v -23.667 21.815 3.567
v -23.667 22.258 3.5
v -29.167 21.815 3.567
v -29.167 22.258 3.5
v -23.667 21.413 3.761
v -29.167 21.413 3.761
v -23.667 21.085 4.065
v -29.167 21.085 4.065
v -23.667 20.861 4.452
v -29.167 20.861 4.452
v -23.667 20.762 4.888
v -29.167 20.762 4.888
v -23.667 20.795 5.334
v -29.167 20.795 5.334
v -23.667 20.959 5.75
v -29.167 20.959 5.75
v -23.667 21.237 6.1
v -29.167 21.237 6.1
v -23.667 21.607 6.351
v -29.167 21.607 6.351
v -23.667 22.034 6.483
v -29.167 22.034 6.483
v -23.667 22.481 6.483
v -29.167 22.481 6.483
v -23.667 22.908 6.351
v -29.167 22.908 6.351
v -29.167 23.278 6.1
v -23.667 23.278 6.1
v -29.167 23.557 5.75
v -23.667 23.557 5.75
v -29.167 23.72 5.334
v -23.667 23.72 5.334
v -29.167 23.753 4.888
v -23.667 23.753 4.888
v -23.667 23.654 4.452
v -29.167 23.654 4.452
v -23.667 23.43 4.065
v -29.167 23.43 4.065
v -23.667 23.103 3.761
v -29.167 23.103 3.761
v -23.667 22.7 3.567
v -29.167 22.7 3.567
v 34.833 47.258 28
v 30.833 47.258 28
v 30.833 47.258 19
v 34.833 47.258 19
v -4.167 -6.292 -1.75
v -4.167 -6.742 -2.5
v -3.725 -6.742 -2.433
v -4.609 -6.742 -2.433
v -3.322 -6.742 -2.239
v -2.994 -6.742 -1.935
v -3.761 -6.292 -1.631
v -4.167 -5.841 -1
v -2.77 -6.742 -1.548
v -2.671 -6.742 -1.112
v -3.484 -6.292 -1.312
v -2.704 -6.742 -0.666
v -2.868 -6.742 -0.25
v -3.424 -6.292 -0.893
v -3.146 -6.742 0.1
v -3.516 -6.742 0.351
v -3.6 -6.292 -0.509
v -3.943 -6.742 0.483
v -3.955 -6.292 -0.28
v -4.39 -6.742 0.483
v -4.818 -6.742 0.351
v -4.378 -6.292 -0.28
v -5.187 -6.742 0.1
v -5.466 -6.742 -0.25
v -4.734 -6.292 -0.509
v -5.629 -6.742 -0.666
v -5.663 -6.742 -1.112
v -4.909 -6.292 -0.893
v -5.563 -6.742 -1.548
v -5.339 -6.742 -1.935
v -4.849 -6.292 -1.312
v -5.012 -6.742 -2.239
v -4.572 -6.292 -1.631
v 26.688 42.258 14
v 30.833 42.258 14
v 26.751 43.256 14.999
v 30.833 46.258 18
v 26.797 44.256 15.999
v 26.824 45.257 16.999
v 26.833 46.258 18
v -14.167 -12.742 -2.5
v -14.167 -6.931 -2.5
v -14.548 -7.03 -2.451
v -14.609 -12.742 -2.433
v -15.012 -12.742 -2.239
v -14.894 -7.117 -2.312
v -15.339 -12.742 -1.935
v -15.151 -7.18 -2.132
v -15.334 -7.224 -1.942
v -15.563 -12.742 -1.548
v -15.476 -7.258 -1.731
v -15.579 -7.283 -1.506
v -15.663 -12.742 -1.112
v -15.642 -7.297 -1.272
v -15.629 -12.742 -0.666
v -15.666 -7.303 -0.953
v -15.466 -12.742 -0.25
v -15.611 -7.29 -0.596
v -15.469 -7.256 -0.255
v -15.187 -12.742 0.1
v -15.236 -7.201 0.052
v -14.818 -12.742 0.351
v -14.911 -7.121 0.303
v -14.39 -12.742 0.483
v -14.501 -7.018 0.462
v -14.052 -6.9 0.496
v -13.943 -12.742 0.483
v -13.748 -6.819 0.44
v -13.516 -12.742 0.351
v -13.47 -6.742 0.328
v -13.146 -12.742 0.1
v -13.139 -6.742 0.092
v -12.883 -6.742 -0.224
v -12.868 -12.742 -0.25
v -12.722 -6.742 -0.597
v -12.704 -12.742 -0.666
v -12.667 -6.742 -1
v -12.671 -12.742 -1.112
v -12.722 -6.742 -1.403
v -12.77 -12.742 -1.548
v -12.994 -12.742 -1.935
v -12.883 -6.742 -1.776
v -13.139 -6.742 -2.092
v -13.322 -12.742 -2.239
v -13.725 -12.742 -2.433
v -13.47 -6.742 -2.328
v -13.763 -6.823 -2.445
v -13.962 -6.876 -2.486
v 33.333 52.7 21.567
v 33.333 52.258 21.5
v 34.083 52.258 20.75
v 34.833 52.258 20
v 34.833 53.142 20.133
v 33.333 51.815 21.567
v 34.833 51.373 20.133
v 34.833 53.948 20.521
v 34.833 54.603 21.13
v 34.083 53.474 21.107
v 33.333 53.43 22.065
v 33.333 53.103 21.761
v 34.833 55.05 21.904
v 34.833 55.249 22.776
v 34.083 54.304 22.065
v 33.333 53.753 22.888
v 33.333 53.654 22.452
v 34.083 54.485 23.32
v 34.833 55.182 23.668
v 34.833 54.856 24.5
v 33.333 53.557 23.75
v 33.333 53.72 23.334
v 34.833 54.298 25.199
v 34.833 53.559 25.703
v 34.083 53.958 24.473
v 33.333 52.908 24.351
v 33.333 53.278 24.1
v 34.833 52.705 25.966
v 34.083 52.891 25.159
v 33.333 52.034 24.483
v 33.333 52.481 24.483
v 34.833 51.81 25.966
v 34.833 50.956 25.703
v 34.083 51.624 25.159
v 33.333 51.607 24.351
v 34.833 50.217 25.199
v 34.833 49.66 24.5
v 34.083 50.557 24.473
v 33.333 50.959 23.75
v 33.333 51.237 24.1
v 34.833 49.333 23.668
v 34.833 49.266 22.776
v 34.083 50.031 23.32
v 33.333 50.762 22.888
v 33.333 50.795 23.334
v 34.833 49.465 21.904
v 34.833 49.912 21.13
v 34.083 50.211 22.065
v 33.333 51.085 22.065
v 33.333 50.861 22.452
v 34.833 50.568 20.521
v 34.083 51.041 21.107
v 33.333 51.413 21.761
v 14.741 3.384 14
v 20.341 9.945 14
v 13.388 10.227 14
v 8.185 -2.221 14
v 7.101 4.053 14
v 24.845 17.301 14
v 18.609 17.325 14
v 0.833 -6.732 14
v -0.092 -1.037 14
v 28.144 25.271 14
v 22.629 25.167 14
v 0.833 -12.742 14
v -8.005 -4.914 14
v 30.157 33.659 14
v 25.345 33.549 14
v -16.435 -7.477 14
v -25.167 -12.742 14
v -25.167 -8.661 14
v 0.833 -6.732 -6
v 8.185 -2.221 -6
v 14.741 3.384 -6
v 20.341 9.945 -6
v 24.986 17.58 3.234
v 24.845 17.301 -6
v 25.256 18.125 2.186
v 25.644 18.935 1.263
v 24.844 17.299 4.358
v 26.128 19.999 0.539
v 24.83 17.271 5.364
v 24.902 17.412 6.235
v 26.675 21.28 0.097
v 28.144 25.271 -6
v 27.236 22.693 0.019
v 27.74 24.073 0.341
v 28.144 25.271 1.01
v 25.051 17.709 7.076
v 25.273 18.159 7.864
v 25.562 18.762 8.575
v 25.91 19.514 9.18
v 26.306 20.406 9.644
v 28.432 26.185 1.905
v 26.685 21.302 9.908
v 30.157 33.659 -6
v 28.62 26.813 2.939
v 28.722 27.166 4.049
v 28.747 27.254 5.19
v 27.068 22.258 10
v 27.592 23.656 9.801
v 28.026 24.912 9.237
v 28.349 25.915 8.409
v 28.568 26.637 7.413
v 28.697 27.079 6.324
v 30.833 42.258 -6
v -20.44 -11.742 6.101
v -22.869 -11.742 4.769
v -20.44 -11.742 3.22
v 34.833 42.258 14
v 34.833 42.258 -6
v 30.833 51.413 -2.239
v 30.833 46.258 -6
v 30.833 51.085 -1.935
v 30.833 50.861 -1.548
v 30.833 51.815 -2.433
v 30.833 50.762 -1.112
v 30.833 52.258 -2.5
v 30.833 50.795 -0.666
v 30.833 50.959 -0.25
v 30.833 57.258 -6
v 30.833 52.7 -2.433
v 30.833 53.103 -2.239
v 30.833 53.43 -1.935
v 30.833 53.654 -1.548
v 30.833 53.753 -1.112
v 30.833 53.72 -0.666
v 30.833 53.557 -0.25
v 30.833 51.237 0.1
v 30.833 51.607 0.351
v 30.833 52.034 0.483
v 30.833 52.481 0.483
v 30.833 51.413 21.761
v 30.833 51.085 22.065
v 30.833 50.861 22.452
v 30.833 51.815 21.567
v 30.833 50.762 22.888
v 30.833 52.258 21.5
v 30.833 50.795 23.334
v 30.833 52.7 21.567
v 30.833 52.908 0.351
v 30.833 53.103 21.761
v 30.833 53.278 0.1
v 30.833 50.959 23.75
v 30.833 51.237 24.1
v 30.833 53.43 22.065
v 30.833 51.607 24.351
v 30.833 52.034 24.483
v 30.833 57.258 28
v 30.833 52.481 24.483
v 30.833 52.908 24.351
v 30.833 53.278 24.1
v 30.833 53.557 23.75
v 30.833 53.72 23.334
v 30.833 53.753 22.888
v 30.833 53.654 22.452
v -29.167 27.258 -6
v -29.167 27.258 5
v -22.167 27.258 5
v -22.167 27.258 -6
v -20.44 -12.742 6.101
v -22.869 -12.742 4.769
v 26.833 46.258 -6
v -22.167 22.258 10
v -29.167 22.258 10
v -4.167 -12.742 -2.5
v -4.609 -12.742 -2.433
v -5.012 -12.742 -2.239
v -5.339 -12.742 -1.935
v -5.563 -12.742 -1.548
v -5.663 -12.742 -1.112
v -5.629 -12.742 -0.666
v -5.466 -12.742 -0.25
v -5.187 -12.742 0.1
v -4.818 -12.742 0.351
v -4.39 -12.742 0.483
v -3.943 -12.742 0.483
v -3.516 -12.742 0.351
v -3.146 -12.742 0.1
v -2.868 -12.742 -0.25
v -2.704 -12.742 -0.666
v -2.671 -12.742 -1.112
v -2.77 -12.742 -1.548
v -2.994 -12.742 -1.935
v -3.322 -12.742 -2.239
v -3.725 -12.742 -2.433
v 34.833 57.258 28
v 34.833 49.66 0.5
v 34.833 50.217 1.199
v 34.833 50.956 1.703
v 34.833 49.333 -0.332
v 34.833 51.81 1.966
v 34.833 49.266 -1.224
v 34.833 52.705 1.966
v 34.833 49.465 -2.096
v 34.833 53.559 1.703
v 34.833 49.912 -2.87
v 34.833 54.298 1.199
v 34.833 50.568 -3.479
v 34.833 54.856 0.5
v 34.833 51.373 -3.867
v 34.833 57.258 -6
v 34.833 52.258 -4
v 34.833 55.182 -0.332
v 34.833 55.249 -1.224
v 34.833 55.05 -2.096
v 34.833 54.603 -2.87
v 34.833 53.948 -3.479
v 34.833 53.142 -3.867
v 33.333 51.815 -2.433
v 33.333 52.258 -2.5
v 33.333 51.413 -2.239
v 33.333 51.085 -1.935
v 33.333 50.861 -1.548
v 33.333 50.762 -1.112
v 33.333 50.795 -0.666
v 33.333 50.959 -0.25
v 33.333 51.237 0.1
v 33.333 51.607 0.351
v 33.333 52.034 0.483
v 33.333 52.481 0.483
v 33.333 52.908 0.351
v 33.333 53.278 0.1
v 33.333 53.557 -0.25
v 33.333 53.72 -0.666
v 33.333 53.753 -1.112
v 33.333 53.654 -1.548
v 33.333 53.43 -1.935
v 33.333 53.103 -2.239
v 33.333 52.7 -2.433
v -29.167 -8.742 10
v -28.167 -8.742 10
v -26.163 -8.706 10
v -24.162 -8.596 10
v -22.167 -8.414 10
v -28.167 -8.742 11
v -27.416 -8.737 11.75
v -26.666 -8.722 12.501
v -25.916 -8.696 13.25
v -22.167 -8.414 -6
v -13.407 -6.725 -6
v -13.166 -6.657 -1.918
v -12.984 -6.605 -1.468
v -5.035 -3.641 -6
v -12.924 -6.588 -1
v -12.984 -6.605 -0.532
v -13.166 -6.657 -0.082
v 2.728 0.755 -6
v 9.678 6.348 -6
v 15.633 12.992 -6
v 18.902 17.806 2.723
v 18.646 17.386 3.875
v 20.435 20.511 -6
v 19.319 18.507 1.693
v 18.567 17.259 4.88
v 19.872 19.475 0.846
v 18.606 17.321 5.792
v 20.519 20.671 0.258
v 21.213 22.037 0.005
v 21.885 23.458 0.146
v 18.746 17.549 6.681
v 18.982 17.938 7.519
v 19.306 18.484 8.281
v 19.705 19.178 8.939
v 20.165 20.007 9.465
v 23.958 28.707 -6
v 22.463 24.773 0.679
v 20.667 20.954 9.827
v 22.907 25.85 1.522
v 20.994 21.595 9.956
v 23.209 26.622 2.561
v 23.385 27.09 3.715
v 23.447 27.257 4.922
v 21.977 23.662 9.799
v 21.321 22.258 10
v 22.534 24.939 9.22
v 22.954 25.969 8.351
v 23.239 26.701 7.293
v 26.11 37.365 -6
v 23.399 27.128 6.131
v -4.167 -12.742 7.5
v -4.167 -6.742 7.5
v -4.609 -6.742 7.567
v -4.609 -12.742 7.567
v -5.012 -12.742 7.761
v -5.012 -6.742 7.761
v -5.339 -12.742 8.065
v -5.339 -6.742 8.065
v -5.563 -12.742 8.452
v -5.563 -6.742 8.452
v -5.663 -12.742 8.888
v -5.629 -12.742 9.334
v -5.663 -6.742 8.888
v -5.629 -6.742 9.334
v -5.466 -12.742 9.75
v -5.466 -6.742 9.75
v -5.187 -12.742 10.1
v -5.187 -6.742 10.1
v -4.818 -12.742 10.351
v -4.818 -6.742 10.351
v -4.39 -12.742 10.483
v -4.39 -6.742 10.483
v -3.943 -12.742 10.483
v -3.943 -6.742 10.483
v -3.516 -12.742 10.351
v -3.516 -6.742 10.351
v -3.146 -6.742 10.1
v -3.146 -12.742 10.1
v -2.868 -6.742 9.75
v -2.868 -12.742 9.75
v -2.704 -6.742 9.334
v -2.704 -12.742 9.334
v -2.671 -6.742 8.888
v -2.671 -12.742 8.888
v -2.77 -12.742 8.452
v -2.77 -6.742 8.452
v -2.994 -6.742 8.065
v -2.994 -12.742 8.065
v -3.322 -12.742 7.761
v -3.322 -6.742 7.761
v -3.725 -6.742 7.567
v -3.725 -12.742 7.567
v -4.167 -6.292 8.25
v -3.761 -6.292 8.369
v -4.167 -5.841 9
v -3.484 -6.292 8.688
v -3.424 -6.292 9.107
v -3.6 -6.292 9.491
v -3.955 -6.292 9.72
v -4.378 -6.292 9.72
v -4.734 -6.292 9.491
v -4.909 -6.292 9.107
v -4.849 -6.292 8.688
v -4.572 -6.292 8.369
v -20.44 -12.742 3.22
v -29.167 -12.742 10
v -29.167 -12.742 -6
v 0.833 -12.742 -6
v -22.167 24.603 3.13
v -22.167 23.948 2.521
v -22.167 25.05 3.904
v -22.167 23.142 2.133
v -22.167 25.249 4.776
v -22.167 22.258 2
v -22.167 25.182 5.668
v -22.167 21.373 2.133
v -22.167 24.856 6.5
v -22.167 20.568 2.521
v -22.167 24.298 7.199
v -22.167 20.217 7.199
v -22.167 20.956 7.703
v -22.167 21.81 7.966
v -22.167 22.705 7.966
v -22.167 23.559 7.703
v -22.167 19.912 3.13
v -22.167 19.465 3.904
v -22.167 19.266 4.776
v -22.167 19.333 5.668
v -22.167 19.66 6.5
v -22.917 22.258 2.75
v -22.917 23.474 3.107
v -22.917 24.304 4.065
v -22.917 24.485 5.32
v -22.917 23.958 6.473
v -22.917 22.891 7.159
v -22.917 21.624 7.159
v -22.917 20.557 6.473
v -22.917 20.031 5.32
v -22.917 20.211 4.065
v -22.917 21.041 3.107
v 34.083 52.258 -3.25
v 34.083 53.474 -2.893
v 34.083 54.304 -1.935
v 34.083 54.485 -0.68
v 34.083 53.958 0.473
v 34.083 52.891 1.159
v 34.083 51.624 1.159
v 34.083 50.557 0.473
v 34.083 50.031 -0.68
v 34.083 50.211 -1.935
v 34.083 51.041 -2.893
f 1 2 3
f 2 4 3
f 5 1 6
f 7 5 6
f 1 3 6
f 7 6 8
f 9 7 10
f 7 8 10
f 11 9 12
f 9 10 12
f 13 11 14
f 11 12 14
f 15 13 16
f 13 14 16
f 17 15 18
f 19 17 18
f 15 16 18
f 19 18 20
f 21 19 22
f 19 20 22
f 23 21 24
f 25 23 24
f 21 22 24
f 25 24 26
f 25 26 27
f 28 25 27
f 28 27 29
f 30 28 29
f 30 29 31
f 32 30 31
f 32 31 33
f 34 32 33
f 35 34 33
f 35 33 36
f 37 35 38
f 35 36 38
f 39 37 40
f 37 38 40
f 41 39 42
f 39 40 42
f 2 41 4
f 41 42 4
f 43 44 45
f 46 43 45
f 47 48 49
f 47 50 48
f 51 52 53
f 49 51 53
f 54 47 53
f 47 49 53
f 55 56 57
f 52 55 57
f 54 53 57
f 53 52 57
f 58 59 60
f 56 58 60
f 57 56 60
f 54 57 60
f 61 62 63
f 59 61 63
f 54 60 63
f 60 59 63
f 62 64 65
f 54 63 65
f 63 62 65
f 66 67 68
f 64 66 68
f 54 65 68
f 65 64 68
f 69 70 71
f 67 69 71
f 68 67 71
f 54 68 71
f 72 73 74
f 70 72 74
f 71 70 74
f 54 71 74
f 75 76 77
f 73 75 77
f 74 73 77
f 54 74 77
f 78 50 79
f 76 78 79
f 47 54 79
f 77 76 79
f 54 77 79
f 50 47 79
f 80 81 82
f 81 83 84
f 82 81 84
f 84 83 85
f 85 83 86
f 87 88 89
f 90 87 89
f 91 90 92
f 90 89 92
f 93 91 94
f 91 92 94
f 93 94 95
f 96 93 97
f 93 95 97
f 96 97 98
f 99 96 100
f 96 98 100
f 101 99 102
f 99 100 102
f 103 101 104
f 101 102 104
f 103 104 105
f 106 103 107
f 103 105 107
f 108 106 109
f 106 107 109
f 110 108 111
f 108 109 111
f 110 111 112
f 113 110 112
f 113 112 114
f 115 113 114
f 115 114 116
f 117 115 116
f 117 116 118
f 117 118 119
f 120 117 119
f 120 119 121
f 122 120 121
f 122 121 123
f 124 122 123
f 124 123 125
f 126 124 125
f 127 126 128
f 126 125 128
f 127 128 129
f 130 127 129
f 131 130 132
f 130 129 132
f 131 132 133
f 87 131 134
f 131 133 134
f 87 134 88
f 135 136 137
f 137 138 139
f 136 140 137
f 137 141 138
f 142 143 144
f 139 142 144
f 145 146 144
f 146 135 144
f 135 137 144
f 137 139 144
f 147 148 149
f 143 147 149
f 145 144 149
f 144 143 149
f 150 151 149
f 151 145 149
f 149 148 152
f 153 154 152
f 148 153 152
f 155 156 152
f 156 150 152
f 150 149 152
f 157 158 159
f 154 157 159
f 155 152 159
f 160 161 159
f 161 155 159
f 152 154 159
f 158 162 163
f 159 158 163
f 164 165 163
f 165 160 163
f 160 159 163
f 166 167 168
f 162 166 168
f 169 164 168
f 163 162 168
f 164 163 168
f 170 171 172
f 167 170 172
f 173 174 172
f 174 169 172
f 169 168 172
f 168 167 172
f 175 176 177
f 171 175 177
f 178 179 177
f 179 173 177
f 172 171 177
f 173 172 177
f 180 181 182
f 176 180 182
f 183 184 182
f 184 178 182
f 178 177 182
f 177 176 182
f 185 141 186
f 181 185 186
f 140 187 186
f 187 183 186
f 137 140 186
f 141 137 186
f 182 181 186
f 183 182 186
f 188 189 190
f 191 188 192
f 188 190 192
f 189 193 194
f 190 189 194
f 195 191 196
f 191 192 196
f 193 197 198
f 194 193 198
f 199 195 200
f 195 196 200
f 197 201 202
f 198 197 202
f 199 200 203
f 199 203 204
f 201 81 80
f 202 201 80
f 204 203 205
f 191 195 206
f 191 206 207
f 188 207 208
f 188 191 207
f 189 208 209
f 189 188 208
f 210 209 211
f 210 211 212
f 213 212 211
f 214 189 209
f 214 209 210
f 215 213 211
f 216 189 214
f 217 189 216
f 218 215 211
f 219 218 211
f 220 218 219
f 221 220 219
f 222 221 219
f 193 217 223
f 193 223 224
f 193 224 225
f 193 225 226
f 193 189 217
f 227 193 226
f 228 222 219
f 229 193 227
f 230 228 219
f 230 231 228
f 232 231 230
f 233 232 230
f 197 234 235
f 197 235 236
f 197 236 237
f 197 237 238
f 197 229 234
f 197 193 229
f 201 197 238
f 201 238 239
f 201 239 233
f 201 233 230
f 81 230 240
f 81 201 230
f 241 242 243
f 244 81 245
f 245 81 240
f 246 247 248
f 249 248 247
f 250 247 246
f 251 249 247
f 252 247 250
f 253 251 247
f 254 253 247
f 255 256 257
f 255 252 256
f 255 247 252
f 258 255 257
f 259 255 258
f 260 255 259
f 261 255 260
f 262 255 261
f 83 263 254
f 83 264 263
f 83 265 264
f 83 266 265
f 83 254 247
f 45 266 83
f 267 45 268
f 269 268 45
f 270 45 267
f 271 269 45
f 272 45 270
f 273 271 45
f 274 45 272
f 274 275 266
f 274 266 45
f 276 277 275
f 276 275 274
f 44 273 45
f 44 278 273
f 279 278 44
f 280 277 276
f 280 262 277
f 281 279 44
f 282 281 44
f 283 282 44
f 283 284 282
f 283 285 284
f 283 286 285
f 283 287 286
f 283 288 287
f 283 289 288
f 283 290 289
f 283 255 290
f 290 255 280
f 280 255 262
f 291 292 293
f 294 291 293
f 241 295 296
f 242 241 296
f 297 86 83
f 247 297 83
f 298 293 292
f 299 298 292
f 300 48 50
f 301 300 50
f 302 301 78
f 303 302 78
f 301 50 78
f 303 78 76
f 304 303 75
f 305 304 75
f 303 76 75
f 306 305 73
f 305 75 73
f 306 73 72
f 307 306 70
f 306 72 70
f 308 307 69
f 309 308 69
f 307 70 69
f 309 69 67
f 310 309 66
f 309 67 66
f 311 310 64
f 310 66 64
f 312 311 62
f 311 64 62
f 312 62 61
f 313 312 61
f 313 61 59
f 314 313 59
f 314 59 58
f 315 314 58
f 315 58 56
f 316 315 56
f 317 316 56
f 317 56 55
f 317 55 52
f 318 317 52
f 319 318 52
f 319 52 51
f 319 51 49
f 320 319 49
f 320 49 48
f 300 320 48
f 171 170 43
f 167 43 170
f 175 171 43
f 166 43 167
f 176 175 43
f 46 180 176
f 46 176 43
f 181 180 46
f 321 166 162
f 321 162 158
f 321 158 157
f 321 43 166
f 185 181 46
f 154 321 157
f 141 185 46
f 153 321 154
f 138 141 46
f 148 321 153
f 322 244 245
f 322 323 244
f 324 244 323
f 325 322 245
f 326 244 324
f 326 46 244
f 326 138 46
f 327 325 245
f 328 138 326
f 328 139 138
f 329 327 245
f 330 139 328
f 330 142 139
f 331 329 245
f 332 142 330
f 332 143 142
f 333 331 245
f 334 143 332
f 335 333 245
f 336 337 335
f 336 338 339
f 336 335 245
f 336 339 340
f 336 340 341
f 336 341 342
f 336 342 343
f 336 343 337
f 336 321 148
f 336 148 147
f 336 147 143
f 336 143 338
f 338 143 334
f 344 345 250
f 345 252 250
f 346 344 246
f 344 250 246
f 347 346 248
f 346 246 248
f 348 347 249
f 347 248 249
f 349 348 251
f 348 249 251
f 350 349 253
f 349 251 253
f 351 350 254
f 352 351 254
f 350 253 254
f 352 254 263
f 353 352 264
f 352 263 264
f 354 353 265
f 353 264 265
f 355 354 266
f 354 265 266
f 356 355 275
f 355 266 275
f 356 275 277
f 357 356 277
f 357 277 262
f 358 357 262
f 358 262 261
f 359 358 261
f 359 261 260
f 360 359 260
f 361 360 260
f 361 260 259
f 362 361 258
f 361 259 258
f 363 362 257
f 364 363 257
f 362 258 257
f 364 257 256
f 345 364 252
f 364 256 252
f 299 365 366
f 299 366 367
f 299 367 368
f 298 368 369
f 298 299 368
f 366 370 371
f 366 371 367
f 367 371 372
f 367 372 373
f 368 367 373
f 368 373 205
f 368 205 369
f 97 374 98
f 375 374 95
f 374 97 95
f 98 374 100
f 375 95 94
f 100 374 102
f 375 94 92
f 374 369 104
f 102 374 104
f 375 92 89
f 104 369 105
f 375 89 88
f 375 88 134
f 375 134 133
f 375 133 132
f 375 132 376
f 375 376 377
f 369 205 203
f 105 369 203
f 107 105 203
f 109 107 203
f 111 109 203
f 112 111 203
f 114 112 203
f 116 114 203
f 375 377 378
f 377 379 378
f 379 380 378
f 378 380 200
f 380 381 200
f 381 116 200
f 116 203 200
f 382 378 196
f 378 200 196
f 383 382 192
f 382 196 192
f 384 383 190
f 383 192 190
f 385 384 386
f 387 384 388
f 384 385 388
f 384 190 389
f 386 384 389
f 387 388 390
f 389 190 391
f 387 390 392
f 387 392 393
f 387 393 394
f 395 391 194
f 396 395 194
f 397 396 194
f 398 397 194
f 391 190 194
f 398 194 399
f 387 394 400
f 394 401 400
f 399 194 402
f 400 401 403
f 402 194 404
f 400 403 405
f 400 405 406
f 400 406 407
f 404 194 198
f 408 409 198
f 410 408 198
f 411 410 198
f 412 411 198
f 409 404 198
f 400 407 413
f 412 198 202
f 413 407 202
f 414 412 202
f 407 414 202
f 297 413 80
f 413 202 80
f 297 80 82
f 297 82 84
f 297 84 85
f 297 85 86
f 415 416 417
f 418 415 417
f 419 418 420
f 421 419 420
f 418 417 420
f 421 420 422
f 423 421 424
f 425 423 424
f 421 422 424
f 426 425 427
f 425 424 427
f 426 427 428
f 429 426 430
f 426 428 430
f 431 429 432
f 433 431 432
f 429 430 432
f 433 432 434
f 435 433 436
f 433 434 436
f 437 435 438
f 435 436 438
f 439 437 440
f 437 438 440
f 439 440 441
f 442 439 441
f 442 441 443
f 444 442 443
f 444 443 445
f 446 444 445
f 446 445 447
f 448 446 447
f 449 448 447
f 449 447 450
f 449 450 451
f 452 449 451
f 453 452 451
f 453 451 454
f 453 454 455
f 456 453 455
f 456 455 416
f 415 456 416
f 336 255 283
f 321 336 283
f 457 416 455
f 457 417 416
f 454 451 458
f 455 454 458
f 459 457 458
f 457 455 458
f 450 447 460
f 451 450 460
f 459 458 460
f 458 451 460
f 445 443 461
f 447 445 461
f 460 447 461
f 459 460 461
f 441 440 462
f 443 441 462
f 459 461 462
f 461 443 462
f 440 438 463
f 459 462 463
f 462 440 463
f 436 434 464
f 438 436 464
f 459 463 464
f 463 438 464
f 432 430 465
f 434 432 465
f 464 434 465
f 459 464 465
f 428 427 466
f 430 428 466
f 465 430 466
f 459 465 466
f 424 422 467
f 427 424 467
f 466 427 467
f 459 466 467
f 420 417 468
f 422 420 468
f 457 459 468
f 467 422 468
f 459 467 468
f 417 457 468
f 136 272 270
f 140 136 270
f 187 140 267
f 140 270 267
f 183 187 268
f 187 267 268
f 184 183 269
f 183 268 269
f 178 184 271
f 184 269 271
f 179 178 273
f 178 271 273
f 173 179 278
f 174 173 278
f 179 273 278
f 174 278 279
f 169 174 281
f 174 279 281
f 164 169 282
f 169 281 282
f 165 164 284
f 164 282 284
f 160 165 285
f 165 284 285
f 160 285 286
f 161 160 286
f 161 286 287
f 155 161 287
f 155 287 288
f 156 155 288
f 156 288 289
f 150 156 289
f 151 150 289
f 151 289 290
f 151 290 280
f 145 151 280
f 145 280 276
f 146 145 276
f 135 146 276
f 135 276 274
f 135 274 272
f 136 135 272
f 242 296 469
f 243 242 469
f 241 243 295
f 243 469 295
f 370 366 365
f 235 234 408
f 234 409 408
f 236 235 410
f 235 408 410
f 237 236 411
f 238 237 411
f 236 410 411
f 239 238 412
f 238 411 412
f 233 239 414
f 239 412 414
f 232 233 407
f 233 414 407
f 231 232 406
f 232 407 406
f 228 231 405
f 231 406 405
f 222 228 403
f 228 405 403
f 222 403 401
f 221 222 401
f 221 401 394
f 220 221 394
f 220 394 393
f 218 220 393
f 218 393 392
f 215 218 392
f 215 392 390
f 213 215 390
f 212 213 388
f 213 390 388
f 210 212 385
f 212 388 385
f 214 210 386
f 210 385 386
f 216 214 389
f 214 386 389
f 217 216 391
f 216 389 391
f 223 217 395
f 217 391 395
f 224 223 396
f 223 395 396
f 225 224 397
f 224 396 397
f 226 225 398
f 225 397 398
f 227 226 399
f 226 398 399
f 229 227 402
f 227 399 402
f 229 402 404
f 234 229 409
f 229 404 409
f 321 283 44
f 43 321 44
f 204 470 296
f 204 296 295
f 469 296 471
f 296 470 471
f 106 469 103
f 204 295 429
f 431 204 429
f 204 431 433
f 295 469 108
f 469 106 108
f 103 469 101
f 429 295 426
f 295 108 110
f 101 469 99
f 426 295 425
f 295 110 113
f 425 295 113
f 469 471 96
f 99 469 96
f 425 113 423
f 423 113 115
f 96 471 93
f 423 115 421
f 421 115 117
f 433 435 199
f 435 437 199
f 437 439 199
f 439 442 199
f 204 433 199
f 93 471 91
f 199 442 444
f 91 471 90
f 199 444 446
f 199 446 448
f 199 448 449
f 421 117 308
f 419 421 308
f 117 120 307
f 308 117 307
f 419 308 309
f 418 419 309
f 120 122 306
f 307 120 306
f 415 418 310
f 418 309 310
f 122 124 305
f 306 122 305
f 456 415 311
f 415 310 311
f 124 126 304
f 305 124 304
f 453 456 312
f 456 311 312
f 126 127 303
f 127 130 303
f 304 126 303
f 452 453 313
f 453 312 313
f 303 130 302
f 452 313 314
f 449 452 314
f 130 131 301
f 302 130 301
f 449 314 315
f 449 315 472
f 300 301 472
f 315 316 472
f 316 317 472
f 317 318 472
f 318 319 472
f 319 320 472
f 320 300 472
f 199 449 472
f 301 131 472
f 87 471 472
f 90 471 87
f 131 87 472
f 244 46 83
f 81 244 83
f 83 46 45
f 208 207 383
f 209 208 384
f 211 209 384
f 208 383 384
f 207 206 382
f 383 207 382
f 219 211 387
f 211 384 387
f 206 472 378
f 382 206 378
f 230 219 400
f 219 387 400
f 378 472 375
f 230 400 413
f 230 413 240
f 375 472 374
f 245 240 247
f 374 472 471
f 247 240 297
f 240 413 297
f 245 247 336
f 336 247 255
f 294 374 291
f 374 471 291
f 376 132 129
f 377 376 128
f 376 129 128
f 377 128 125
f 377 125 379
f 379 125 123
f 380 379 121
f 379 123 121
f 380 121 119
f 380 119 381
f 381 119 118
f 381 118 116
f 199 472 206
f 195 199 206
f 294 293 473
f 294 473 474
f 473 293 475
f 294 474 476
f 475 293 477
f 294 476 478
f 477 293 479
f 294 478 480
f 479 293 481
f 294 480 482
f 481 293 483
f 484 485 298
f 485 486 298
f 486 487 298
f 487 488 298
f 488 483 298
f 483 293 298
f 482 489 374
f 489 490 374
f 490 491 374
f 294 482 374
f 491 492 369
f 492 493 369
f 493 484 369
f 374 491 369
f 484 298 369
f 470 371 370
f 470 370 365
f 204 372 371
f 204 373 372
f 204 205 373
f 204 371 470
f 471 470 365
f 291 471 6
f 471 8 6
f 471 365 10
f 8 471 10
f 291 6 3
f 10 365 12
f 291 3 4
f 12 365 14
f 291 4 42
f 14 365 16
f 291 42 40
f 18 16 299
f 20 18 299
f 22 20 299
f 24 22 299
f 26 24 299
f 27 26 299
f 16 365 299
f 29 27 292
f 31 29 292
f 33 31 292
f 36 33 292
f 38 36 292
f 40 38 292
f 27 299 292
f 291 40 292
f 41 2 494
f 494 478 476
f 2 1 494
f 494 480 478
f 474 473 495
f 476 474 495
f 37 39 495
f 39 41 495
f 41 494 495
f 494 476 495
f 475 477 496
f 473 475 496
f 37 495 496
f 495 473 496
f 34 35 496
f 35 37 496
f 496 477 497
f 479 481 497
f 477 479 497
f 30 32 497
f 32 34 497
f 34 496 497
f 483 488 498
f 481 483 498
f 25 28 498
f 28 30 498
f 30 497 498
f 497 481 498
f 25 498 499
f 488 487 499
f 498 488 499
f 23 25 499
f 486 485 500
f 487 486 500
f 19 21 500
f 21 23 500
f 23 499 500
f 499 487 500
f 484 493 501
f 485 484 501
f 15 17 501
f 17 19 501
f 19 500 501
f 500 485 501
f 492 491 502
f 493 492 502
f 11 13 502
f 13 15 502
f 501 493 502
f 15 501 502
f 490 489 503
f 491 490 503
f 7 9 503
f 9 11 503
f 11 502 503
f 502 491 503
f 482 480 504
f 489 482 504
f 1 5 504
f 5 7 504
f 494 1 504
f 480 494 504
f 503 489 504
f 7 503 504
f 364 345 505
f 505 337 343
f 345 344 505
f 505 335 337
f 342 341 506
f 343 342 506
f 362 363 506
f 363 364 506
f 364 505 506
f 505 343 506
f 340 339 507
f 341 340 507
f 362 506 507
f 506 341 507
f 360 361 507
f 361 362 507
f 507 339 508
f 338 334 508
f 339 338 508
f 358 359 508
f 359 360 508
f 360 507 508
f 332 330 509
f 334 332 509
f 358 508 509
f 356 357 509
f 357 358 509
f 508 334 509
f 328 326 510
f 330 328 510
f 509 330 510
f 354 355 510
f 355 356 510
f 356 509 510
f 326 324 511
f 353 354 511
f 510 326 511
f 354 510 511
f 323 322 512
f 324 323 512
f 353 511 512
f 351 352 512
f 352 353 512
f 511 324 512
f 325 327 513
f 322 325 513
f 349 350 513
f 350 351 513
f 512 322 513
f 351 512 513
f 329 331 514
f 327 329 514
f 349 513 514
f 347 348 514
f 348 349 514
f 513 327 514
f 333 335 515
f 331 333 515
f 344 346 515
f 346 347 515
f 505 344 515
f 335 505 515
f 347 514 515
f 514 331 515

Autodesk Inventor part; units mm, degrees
ref_plane "YZ Plane" through (0, 0, 0) normal (1, 0, 0) x (0, 1, 0)
ref_plane "XZ Plane" through (0, 0, 0) normal (0, 1, 0) x (-1, 0, 0)
ref_plane "XY Plane" through (0, 0, 0) normal (0, 0, 1) x (1, 0, 0)
sketch "Sketch1" plane through (0, 0, 0) normal (0, 0, 1) x (1, 0, 0)
  line L0 (-29.1667, 27.2576) -> (-22.1667, 27.2576)
  line L1 (-22.1667, 27.2576) -> (-22.1667, -12.7424)
  line L2 (-22.1667, -12.7424) -> (-29.1667, -12.7424)
  line L3 (-29.1667, -12.7424) -> (-29.1667, 27.2576)
  point P0 (0, 0)
  dimension "d0" = 7
  dimension "d1" = 40
extrude "Extrusion1" add sketch "Sketch1" along normal blind 10
sketch "Sketch2" plane through (-22.1667, -12.7424, 0) normal (1, 0, 0) x (0, 0, -1)
  line L0 (-10, 0) -> (-10, 40) projected
  line L1 (0, 40) -> (-10, 40) projected
  point P0 (0, 12.7424)
  point P1 (-5, 35)
  dimension "d4" = 5
  dimension "d5" = 5
hole "Hole1" at (-22.1667, 22.2576, 5) direction (-1, 0, 0) diameter 3 depth 8 tip angle 118 countersink diameter 6 countersink angle 90
sketch "Sketch3" plane through (0, 0, 10) normal (0, 0, 1) x (1, 0, 0)
  line L0 (-29.1667, -12.7424) -> (30.8333, -12.7424)
  line L1 (30.8333, -12.7424) -> (30.8333, -8.7424)
  line L2 (30.8333, -8.7424) -> (-29.1667, -8.7424)
  line L3 (-29.1667, -8.7424) -> (-29.1667, -12.7424)
  line L4 (30.8333, -12.7424) -> (26.8333, -12.7424)
  line L5 (26.8333, -12.7424) -> (26.8333, 52.2576)
  line L6 (26.8333, 52.2576) -> (30.8333, 52.2576)
  line L7 (30.8333, 52.2576) -> (30.8333, -12.7424)
  point P0 (0, 0)
  dimension "d13" = 60
  dimension "d14" = 4
  dimension "d15" = 4
  dimension "d16" = 65
extrude "Extrusion2" add sketch "Sketch3" against normal blind 10
sketch "Sketch4" plane through (30.8333, 52.2576, 10) normal (1, 0, 0) x (0, 0, -1)
  line L0 (16, -5) -> (-18, -5)
  line L1 (-18, -5) -> (-18, 5)
  line L2 (-18, 5) -> (16, 5)
  line L3 (16, 5) -> (16, -5)
  line L4 (0, 0) -> (10, 0) projected
  circle A0 centre (5, -30) radius 1.5 projected
  point P0 (10, -52.2576)
  dimension "d21" = 5
  dimension "d22" = 23
  dimension "d23" = 11
  dimension "d24" = 5
extrude "Extrusion3" add sketch "Sketch4" against normal blind 4 contours L0 L1 L2 L3
sketch "Sketch9" plane through (0, 0, 10) normal (0, 0, 1) x (1, 0, 0)
  line L0 (26.7106, 42.2576) -> (30.8333, 47.2576)
  line L1 (30.8333, 47.2576) -> (34.8333, 47.2576)
  line L2 (34.8333, 47.2576) -> (30.8333, 47.2576) projected
  line L3 (34.8333, 47.2576) -> (30.7106, 42.2576)
  line L4 (30.7106, 42.2576) -> (26.7106, 42.2576)
  point P0 (0, 0)
extrude "Extrusion8" add sketch "Sketch9" against normal blind 10
sketch "Sketch10" plane through (0, 0, 10) normal (0, 0, 1) x (1, 0, 0)
  line L0 (30.8333, 42.2576) -> (34.8333, 47.2576)
  line L1 (34.8333, 47.2576) -> (34.8333, 42.2576)
  line L2 (30.8333, 47.2576) -> (34.8333, 47.2576) projected
  line L3 (34.8333, 42.2576) -> (30.8333, 42.2576)
  point P0 (0, 0)
extrude "Extrusion9" cut sketch "Sketch10" against normal blind 10
sketch "Sketch12" plane through (0, 0, 0) normal (0, 0, -1) x (-1, 0, 0)
  point P0 (0, 0)
sketch "Sketch13" plane through (0, 0, 0) normal (0, 0, -1) x (-1, 0, 0)
  line L0 (29.1667, -12.7424) -> (-30.8333, -12.7424)
  line L1 (-30.8333, -12.7424) -> (-30.8333, -8.7424)
  line L2 (-30.8333, -8.7424) -> (29.1667, -8.7424)
  line L3 (29.1667, -8.7424) -> (29.1667, -12.7424)
  line L4 (-30.8333, 42.2576) -> (-26.8333, 42.2576)
  line L5 (-26.8333, 42.2576) -> (-26.8333, -12.7424)
  line L6 (-26.8333, -12.7424) -> (-30.8333, -12.7424)
  line L7 (-30.8333, -12.7424) -> (-30.8333, 42.2576)
  line L8 (-30.8333, 42.2576) -> (-34.8333, 47.2576)
  line L9 (-34.8333, 47.2576) -> (-30.8333, 42.2576) projected
  line L10 (-34.8333, 47.2576) -> (-30.8333, 47.2576)
  line L11 (-30.8333, 47.2576) -> (-26.8333, 42.2576)
  point P0 (0, 0)
  dimension "d53" = 60
  dimension "d54" = 4
  dimension "d55" = 4
extrude "Extrusion10" add sketch "Sketch13" along normal blind 6
sketch "Sketch14" plane through (0, 0, 10) normal (0, 0, 1) x (1, 0, 0)
  point P0 (0, 0)
sketch "Sketch15" plane through (0, 0, 10) normal (0, 0, 1) x (1, 0, 0)
  line L0 (-29.1667, -12.7424) -> (30.8333, -12.7424) projected
  line L1 (34.8333, 47.2576) -> (-22.1667, 47.2576)
  line L2 (-22.1667, 47.2576) -> (-22.1667, -12.7424)
  line L3 (-22.1667, -12.7424) -> (34.8333, -12.7424)
  line L4 (34.8333, -12.7424) -> (34.8333, 47.2576)
  line L5 (-22.1667, -8.7424) -> (-22.1667, 27.2576) projected
  point P0 (0, 0)
extrude "Extrusion11" cut sketch "Sketch15" against normal blind 20
sketch "Sketch16" plane through (0, 0, -6) normal (0, 0, -1) x (-1, 0, 0)
  line L0 (29.1667, -12.7424) -> (-30.8333, -12.7424)
  line L1 (-30.8333, -12.7424) -> (-30.8333, -8.7424)
  line L2 (-30.8333, -8.7424) -> (29.1667, -8.7424)
  line L3 (29.1667, -8.7424) -> (29.1667, -12.7424)
  line L4 (-30.8333, 47.2576) -> (-26.8333, 47.2576)
  line L5 (-26.8333, 47.2576) -> (-26.8333, -12.7424)
  line L6 (-26.8333, -12.7424) -> (-30.8333, -12.7424)
  line L7 (-30.8333, -12.7424) -> (-30.8333, 47.2576)
  line L8 (-30.8333, 57.2576) -> (-30.8333, 47.2576) projected
  point P0 (0, 0)
  dimension "d60" = 4
  dimension "d61" = 4
extrude "Extrusion12" add sketch "Sketch16" against normal blind 20
sketch "Sketch17" plane through (0, 0, 0) normal (0, 0, -1) x (-1, 0, 0)
  line L0 (29.1667, 27.2576) -> (22.1667, 27.2576)
  line L1 (22.1667, 27.2576) -> (22.1667, -8.7424)
  line L2 (22.1667, -8.7424) -> (29.1667, -8.7424)
  line L3 (29.1667, -8.7424) -> (29.1667, 27.2576)
  point P0 (0, 0)
extrude "Extrusion13" add sketch "Sketch17" along normal blind 6
sketch "Sketch18" plane through (30.8333, 47.2576, 28) normal (1, 0, 0) x (0, 0, -1)
  line L0 (0, 0) -> (0, 10) projected
  line L1 (34, 10) -> (34, -60) projected
  point P0 (28, -47.2576)
  point P1 (5, 5)
  point P2 (29, 5)
  dimension "d66" = 5
  dimension "d67" = 5
hole "Hole3" at (30.8333, 52.2576, 23) at (30.8333, 52.2576, -1) direction (-1, 0, 0) diameter 3 depth 8 tip angle 118 countersink diameter 6 countersink angle 90
fillet "Fillet4" radius 55 2 edges at (26.8333, -8.7424, 4) (30.8333, -12.7424, 4)
chamfer "Chamfer2" distance 4 angle 45 1 edges at (-29.1667, -10.7424, 14)
chamfer "Chamfer3" distance 5 angle 45 2 edges at (28.8333, 47.2576, 14) (-25.6667, 27.2576, 10)
sketch "Sketch19" plane through (30.8333, 47.2576, 28) normal (1, 0, 0) x (0, 0, -1)
  line L0 (0, 0) -> (34, 0)
  line L1 (34, 0) -> (34, 10)
  line L2 (34, 10) -> (0, 10)
  line L3 (0, 10) -> (0, 0)
  point P0 (28, -47.2576)
extrude "Extrusion14" add sketch "Sketch19" along normal blind 4
sketch "Sketch20" plane through (30.8333, 42.2576, -6) normal (1, 0, 0) x (0, 0, -1)
  line L0 (-20, 0) -> (0, 0)
  line L1 (0, 0) -> (0, 5)
  line L2 (0, 5) -> (-20, 5)
  line L3 (-20, 5) -> (-20, 0)
  point P0 (-6, -42.2576)
extrude "Extrusion15" add sketch "Sketch20" along normal blind 4
chamfer "Chamfer4" distance 5 angle 45 1 edges at (32.8333, 47.2576, 14)
sketch "Sketch21" plane through (26.8333, 47.2576, 28) normal (-1, 0, 0) x (0, 0, 1)
  line L0 (-34, -5) -> (-34, 10) projected
  line L1 (0, 10) -> (-34, 10)
  line L2 (-34, 10) -> (-34, 0)
  line L3 (-34, 0) -> (0, 0)
  line L4 (0, 0) -> (0, 10)
  line L5 (-9, 0) -> (0, 0) projected
  point P0 (-28, -47.2576)
extrude "Extrusion16" cut sketch "Sketch21" against normal blind 4
chamfer "Chamfer5" distance 1 angle 45 1 edges at (26.8333, 47.2576, 6.5)
sketch "Sketch22" plane through (34.8333, 47.2576, 28) normal (1, 0, 0) x (0, 0, -1)
  line L0 (0, 10) -> (0, 0) projected
  line L1 (34, 10) -> (0, 10) projected
  line L2 (34, -5) -> (34, 10) projected
  point P0 (28, -47.2576)
  point P1 (5, 5)
  point P2 (29, 5)
  dimension "d94" = 5
  dimension "d95" = 5
  dimension "d96" = 5
  dimension "d97" = 5
hole "Hole4" at (34.8333, 52.2576, 23) at (34.8333, 52.2576, -1) direction (-1, 0, 0) diameter 3 depth 8 tip angle 118 countersink diameter 6 countersink angle 90
sketch "Sketch23" plane through (30.8333, 47.2576, 19) normal (0, 1, 0) x (1, 0, 0)
  line L0 (0, 0) -> (-4, 0)
  line L1 (-4, 0) -> (-4, 25)
  line L2 (-4, 25) -> (0, 25)
  line L3 (0, 25) -> (0, 0)
  point P0 (-30.8333, 19)
extrude "Extrusion17" cut sketch "Sketch23" against normal blind 1
sketch "Sketch24" plane through (0, 0, 10) normal (0, 0, 1) x (1, 0, 0)
  point P0 (0, 0)
ref_plane "Work Plane1" through (15.8333, -12.7424, -6) normal (-1, 0, 0) x (0, 0, 1)
sketch "Sketch25" plane through (15.8333, -12.7424, -6) normal (-1, 0, 0) x (0, 0, 1)
  circle A0 centre (11, 35) radius 1.5 projected
  circle A1 centre (11, 35) radius 5
  point P0 (6, 12.7424)
  dimension "d108" = 10
extrude "Extrusion18" cut sketch "Sketch25" against normal blind 50 contours A0 | A1
sketch "Sketch26" plane through (0, 0, 14) normal (0, 0, 1) x (1, 0, 0)
  line L0 (-24.1667, -12.7424) -> (0.8333, -12.7424)
  line L1 (0.8333, -12.7424) -> (0.8333, -8.7424)
  line L2 (0.8333, -8.7424) -> (-24.1667, -8.7424)
  line L3 (-24.1667, -8.7424) -> (-24.1667, -12.7424)
  line L4 (0.8333, -8.7424) -> (-4.1667, -8.7424)
  line L5 (-4.1667, -8.7424) -> (-4.1667, -5.7424)
  line L6 (-4.1667, -5.7424) -> (0.8333, -5.7424)
  line L7 (0.8333, -5.7424) -> (0.8333, -8.7424)
  point P0 (0, 0)
  dimension "d111" = 25
  dimension "d112" = 4
  dimension "d113" = 5
  dimension "d114" = 3
extrude "Extrusion19" add sketch "Sketch26" against normal blind 20
sketch "Sketch27" plane through (-29.1667, -12.7424, -6) normal (0, -1, 0) x (1, 0, 0)
  line L0 (55.8544, 20) -> (4, 20) projected
  line L1 (30, 20) -> (30, 0) projected
  line L2 (30, 0) -> (0, 0) projected
  point P0 (29.1667, 6)
  point P1 (25, 15)
  point P2 (25, 5)
  point P3 (15, 5)
  dimension "d117" = 5
  dimension "d118" = 5
  dimension "d119" = 5
  dimension "d120" = 5
  dimension "d121" = 10
hole "Hole5" at (-4.1667, -12.7424, 9) at (-4.1667, -12.7424, -1) at (-14.1667, -12.7424, -1) direction (0, 1, 0) diameter 3 depth 6 tip angle 118
sketch "Sketch28" plane through (-29.1667, -12.7424, -6) normal (0, -1, 0) x (1, 0, 0)
  line L0 (8.7267, 12.1008) -> (6.2978, 10.7688)
  line L1 (6.2978, 10.7688) -> (8.7267, 9.2201)
  line L2 (8.7267, 9.2201) -> (8.7267, 12.1008)
  point P0 (29.1667, 6)
extrude "Extrusion20" cut sketch "Sketch28" against normal blind 1
properties part number "z-stepper support arm"
